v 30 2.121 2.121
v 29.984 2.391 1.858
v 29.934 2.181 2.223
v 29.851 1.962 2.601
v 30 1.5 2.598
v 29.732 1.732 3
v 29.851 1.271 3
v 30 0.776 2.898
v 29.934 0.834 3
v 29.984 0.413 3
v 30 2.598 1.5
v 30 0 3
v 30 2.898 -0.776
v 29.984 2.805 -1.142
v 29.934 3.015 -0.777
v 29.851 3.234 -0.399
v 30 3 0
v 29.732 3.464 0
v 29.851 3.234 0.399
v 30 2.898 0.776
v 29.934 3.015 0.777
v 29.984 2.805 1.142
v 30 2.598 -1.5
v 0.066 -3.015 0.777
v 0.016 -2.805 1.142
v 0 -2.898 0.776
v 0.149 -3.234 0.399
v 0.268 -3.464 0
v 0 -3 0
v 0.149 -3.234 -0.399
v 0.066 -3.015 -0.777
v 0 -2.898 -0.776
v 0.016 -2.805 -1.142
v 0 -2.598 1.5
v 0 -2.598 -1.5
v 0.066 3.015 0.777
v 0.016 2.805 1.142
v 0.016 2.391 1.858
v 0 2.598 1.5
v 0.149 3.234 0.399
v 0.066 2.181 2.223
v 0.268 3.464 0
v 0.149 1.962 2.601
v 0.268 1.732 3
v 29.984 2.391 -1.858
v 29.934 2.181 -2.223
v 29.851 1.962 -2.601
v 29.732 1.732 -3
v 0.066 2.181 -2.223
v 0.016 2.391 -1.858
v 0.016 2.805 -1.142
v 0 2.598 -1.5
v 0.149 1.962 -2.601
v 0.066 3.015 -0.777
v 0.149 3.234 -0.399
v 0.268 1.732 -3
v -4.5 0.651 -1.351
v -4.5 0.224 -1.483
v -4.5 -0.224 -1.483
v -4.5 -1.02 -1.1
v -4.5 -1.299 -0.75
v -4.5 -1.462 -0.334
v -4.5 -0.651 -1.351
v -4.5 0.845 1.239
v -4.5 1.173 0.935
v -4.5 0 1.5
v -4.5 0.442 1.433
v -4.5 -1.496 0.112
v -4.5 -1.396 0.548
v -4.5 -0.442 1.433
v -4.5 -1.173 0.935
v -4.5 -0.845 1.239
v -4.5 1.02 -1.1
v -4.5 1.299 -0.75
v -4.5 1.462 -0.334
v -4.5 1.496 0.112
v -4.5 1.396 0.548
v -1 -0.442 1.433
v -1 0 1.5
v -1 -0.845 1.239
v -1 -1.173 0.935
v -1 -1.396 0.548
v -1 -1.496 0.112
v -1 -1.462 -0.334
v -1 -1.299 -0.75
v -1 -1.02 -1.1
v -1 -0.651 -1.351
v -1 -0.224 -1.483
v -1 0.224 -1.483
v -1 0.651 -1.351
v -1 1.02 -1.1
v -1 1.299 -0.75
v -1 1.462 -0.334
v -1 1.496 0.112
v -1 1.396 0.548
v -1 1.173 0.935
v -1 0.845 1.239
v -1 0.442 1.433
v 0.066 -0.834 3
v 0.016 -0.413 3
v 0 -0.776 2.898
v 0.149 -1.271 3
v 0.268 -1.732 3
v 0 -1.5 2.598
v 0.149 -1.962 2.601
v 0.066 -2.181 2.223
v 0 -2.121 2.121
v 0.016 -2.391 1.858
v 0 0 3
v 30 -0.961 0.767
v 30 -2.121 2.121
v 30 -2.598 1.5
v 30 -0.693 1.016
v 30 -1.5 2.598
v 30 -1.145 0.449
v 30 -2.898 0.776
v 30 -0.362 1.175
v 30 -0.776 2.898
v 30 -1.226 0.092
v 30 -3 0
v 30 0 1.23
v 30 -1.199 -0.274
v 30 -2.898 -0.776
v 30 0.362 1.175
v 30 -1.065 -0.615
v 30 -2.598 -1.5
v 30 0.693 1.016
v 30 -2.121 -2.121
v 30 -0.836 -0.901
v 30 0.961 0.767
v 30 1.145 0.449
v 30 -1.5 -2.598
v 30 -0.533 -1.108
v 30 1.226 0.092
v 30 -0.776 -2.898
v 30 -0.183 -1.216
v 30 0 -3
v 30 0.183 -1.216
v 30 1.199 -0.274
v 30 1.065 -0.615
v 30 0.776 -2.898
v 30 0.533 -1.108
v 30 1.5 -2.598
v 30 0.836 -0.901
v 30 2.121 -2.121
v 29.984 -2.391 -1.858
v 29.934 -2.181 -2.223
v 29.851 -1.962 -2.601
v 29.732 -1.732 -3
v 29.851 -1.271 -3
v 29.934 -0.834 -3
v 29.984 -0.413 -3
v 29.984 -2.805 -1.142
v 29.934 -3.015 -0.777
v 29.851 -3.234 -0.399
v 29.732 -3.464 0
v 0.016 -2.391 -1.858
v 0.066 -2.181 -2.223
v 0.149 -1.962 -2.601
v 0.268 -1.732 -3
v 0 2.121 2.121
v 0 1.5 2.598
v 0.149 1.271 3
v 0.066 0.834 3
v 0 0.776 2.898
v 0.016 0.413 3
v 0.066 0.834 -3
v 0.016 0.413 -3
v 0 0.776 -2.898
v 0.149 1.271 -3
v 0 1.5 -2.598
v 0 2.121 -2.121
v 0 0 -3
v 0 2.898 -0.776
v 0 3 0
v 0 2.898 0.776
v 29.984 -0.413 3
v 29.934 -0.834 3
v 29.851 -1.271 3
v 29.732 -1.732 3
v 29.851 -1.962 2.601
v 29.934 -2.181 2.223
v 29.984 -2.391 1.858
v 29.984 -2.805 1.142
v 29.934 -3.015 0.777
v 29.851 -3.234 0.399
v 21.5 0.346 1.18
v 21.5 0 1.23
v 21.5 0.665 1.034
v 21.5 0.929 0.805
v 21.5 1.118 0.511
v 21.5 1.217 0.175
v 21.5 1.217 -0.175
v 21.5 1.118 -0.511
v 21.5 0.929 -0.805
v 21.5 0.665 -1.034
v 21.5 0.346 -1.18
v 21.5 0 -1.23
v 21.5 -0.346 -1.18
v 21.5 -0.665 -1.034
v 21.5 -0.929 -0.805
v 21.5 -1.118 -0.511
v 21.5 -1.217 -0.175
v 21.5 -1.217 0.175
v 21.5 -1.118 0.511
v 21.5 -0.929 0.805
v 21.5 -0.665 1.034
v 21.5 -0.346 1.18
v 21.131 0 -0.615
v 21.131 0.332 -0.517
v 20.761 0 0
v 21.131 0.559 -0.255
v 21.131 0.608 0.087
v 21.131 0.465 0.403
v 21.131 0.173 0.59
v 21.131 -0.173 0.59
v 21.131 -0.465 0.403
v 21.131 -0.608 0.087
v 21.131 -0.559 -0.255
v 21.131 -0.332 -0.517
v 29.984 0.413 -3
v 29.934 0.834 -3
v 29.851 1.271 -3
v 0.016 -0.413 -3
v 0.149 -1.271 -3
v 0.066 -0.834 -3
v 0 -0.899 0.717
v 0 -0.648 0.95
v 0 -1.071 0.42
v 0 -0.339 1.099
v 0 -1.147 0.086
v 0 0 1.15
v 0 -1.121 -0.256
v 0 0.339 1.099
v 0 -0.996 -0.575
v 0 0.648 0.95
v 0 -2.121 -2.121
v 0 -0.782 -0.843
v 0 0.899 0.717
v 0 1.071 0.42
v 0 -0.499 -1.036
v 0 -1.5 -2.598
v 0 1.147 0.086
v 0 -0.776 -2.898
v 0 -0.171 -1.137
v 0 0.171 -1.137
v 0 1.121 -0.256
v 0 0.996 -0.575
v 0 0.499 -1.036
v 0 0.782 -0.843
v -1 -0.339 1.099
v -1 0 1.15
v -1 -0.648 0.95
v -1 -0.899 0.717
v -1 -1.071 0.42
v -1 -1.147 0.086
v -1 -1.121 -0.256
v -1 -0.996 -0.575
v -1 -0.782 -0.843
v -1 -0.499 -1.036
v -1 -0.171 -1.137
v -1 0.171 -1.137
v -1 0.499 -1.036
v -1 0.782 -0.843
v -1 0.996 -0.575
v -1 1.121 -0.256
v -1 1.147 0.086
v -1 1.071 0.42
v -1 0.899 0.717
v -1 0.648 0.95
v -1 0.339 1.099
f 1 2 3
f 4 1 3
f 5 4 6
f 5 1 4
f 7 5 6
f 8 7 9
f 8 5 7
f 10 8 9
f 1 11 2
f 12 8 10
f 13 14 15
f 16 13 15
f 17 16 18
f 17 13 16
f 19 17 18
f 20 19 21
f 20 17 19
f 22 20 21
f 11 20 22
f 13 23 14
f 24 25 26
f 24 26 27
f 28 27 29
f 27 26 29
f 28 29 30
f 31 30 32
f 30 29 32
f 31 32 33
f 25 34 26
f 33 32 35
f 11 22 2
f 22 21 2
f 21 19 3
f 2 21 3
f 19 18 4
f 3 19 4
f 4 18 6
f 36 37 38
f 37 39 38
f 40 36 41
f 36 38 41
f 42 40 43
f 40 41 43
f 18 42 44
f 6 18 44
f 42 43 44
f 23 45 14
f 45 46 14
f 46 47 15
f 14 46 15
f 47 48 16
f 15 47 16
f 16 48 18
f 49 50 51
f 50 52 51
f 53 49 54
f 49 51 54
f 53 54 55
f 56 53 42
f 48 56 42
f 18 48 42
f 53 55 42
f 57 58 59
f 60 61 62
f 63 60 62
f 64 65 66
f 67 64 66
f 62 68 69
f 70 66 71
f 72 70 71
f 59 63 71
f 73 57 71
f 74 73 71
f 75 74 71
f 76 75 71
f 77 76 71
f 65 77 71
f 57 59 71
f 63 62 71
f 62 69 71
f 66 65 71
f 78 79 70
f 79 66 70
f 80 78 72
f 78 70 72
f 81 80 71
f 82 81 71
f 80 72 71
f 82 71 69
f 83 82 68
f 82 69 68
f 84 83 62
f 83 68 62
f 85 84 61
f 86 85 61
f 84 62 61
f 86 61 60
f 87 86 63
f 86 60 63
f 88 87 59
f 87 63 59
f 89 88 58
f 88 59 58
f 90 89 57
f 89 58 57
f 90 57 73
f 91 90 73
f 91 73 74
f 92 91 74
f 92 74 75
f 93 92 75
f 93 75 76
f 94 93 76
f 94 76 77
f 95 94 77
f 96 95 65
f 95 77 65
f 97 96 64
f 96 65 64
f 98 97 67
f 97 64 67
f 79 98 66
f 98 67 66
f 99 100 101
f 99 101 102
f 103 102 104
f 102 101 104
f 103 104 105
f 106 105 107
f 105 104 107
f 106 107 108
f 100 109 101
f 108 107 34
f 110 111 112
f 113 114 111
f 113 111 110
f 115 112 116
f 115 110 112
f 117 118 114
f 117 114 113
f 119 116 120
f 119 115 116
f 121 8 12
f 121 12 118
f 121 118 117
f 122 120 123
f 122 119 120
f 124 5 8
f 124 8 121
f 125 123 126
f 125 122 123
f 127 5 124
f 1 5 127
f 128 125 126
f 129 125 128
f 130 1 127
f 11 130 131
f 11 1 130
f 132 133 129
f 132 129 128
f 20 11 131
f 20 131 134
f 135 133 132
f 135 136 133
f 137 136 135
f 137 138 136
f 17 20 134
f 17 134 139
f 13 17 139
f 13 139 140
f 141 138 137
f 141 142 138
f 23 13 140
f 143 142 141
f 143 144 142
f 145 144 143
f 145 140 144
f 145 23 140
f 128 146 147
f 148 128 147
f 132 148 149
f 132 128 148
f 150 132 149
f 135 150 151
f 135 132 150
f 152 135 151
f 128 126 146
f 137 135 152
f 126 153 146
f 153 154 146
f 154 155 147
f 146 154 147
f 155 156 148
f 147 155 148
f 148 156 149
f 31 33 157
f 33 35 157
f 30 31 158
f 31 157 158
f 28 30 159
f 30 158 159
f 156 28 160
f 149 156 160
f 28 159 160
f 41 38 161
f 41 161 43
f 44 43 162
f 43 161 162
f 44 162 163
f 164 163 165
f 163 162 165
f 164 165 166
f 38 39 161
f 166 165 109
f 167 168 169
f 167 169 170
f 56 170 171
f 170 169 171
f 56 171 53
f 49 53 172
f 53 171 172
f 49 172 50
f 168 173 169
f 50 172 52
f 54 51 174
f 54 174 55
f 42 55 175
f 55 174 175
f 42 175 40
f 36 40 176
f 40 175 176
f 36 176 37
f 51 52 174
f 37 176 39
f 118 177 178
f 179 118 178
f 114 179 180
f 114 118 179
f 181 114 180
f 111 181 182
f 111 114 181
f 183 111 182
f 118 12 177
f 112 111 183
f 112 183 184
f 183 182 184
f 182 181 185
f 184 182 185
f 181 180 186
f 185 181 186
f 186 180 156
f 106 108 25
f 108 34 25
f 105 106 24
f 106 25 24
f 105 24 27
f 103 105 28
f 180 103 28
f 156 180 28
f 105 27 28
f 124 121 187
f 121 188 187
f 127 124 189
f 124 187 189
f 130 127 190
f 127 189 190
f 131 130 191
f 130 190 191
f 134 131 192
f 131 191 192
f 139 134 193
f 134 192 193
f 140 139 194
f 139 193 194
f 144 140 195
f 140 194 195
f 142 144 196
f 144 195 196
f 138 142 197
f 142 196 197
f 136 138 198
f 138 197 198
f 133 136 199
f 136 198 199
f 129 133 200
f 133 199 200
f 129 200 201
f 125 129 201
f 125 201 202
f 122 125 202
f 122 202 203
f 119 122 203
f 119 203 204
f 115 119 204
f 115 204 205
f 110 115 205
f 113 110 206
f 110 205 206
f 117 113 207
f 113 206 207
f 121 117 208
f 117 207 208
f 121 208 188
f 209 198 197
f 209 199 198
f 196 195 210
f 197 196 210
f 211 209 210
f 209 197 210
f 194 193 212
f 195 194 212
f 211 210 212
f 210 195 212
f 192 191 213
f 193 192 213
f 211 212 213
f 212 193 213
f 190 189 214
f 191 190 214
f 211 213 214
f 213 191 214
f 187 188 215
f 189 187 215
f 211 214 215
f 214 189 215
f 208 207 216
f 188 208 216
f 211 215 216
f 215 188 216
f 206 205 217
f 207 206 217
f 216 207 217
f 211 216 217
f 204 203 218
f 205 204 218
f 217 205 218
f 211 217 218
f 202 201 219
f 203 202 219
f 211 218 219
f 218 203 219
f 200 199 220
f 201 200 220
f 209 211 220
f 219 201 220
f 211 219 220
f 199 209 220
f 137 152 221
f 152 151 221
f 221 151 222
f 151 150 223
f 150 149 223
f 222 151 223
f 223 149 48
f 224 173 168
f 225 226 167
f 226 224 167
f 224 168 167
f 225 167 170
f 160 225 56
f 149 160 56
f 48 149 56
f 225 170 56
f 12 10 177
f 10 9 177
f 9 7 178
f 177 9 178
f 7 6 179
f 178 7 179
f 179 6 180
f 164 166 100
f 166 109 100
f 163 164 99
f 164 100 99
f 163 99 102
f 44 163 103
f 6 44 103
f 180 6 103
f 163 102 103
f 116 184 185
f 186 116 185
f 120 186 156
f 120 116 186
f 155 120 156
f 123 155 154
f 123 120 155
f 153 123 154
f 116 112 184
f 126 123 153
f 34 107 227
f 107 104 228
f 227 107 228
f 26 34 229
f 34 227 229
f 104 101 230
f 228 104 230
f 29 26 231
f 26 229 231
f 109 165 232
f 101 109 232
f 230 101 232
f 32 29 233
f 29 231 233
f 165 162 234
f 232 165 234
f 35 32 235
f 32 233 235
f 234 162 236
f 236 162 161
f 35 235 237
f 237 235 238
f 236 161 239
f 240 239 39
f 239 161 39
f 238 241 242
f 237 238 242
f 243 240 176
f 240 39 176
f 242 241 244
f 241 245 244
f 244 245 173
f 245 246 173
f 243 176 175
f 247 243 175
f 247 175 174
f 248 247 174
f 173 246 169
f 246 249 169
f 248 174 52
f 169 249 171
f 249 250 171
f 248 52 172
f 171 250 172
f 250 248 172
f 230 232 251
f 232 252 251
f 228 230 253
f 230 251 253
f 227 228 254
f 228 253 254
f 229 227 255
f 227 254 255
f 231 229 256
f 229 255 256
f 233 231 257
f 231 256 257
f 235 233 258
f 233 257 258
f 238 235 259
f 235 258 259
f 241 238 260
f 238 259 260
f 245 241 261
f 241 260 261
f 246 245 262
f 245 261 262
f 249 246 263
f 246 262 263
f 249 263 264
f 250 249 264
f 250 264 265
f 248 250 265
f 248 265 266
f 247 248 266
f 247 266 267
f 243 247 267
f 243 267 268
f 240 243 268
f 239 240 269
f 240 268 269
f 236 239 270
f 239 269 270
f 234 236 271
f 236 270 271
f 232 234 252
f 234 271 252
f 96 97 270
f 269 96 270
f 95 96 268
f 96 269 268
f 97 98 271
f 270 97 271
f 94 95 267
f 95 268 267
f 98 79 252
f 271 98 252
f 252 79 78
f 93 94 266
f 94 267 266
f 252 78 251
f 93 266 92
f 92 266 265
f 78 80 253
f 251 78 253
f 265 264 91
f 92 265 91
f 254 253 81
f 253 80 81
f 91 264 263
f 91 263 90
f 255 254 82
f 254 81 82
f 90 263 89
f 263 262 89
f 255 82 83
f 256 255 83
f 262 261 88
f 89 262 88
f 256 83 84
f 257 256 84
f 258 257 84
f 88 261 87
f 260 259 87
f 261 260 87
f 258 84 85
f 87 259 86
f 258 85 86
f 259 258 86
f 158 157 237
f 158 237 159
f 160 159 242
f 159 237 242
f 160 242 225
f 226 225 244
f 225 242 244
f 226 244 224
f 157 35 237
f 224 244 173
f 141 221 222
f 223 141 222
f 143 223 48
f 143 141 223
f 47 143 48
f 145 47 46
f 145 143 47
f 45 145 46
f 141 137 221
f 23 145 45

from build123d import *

# Parameters (mm, degrees)
BOSS_EXTRUDE1_DEPTH = 30
TAP1_D              = 2.459
TAP1_DEPTH          = 8.5
TAP1_TIP            = 0.738758131


with BuildPart() as part:
    # Sketch1 → Boss-Extrude1 (new body)
    with BuildSketch(Plane(origin=(0, 0, 0), x_dir=(0, 0, -1), z_dir=(1, 0, 0))):
        Polygon((3, 1.732050808), (0, 3.464101615), (-3, 1.732050808), (-3, -1.732050808), (0, -3.464101615), (3, -1.732050808), align=None)
    extrude(amount=BOSS_EXTRUDE1_DEPTH)

    # Sketch2 → Cut-Revolve1 (revolve, cut)
    with BuildSketch(Plane.XY):
        Polygon((0, 3.464101615), (0.267949192, 3.464101615), (0, 3), align=None)
        Polygon((29.732050808, 3.464101615), (30, 3), (30, 3.464101615), align=None)
    revolve(axis=Axis((-88.99, 0, 0), (1, 0, 0)), mode=Mode.SUBTRACT)

    # Tap1
    with Locations(Plane(origin=(30, -0.086368032, -2.129727113), x_dir=(0, 0, -1), z_dir=(1, 0, 0))):
        with Locations((-2.129727113, 0.086368032)):
            Hole(TAP1_D / 2, depth=TAP1_DEPTH)
            with Locations((0, 0, -(TAP1_DEPTH + TAP1_TIP / 2))):  # 118° drill point
                Cone(0, TAP1_D / 2, TAP1_TIP, mode=Mode.SUBTRACT)

    # Sketch5 → Revolve1 (revolve)
    with BuildSketch(Plane.XY):
        Polygon((0, 1.15), (-1, 1.15), (-1, 1.5), (-4.5, 1.5), (-4.5, 0), (0, 0), align=None)
    revolve(axis=Axis((-88.99, 0, 0), (1, 0, 0)))


solid = part.part
